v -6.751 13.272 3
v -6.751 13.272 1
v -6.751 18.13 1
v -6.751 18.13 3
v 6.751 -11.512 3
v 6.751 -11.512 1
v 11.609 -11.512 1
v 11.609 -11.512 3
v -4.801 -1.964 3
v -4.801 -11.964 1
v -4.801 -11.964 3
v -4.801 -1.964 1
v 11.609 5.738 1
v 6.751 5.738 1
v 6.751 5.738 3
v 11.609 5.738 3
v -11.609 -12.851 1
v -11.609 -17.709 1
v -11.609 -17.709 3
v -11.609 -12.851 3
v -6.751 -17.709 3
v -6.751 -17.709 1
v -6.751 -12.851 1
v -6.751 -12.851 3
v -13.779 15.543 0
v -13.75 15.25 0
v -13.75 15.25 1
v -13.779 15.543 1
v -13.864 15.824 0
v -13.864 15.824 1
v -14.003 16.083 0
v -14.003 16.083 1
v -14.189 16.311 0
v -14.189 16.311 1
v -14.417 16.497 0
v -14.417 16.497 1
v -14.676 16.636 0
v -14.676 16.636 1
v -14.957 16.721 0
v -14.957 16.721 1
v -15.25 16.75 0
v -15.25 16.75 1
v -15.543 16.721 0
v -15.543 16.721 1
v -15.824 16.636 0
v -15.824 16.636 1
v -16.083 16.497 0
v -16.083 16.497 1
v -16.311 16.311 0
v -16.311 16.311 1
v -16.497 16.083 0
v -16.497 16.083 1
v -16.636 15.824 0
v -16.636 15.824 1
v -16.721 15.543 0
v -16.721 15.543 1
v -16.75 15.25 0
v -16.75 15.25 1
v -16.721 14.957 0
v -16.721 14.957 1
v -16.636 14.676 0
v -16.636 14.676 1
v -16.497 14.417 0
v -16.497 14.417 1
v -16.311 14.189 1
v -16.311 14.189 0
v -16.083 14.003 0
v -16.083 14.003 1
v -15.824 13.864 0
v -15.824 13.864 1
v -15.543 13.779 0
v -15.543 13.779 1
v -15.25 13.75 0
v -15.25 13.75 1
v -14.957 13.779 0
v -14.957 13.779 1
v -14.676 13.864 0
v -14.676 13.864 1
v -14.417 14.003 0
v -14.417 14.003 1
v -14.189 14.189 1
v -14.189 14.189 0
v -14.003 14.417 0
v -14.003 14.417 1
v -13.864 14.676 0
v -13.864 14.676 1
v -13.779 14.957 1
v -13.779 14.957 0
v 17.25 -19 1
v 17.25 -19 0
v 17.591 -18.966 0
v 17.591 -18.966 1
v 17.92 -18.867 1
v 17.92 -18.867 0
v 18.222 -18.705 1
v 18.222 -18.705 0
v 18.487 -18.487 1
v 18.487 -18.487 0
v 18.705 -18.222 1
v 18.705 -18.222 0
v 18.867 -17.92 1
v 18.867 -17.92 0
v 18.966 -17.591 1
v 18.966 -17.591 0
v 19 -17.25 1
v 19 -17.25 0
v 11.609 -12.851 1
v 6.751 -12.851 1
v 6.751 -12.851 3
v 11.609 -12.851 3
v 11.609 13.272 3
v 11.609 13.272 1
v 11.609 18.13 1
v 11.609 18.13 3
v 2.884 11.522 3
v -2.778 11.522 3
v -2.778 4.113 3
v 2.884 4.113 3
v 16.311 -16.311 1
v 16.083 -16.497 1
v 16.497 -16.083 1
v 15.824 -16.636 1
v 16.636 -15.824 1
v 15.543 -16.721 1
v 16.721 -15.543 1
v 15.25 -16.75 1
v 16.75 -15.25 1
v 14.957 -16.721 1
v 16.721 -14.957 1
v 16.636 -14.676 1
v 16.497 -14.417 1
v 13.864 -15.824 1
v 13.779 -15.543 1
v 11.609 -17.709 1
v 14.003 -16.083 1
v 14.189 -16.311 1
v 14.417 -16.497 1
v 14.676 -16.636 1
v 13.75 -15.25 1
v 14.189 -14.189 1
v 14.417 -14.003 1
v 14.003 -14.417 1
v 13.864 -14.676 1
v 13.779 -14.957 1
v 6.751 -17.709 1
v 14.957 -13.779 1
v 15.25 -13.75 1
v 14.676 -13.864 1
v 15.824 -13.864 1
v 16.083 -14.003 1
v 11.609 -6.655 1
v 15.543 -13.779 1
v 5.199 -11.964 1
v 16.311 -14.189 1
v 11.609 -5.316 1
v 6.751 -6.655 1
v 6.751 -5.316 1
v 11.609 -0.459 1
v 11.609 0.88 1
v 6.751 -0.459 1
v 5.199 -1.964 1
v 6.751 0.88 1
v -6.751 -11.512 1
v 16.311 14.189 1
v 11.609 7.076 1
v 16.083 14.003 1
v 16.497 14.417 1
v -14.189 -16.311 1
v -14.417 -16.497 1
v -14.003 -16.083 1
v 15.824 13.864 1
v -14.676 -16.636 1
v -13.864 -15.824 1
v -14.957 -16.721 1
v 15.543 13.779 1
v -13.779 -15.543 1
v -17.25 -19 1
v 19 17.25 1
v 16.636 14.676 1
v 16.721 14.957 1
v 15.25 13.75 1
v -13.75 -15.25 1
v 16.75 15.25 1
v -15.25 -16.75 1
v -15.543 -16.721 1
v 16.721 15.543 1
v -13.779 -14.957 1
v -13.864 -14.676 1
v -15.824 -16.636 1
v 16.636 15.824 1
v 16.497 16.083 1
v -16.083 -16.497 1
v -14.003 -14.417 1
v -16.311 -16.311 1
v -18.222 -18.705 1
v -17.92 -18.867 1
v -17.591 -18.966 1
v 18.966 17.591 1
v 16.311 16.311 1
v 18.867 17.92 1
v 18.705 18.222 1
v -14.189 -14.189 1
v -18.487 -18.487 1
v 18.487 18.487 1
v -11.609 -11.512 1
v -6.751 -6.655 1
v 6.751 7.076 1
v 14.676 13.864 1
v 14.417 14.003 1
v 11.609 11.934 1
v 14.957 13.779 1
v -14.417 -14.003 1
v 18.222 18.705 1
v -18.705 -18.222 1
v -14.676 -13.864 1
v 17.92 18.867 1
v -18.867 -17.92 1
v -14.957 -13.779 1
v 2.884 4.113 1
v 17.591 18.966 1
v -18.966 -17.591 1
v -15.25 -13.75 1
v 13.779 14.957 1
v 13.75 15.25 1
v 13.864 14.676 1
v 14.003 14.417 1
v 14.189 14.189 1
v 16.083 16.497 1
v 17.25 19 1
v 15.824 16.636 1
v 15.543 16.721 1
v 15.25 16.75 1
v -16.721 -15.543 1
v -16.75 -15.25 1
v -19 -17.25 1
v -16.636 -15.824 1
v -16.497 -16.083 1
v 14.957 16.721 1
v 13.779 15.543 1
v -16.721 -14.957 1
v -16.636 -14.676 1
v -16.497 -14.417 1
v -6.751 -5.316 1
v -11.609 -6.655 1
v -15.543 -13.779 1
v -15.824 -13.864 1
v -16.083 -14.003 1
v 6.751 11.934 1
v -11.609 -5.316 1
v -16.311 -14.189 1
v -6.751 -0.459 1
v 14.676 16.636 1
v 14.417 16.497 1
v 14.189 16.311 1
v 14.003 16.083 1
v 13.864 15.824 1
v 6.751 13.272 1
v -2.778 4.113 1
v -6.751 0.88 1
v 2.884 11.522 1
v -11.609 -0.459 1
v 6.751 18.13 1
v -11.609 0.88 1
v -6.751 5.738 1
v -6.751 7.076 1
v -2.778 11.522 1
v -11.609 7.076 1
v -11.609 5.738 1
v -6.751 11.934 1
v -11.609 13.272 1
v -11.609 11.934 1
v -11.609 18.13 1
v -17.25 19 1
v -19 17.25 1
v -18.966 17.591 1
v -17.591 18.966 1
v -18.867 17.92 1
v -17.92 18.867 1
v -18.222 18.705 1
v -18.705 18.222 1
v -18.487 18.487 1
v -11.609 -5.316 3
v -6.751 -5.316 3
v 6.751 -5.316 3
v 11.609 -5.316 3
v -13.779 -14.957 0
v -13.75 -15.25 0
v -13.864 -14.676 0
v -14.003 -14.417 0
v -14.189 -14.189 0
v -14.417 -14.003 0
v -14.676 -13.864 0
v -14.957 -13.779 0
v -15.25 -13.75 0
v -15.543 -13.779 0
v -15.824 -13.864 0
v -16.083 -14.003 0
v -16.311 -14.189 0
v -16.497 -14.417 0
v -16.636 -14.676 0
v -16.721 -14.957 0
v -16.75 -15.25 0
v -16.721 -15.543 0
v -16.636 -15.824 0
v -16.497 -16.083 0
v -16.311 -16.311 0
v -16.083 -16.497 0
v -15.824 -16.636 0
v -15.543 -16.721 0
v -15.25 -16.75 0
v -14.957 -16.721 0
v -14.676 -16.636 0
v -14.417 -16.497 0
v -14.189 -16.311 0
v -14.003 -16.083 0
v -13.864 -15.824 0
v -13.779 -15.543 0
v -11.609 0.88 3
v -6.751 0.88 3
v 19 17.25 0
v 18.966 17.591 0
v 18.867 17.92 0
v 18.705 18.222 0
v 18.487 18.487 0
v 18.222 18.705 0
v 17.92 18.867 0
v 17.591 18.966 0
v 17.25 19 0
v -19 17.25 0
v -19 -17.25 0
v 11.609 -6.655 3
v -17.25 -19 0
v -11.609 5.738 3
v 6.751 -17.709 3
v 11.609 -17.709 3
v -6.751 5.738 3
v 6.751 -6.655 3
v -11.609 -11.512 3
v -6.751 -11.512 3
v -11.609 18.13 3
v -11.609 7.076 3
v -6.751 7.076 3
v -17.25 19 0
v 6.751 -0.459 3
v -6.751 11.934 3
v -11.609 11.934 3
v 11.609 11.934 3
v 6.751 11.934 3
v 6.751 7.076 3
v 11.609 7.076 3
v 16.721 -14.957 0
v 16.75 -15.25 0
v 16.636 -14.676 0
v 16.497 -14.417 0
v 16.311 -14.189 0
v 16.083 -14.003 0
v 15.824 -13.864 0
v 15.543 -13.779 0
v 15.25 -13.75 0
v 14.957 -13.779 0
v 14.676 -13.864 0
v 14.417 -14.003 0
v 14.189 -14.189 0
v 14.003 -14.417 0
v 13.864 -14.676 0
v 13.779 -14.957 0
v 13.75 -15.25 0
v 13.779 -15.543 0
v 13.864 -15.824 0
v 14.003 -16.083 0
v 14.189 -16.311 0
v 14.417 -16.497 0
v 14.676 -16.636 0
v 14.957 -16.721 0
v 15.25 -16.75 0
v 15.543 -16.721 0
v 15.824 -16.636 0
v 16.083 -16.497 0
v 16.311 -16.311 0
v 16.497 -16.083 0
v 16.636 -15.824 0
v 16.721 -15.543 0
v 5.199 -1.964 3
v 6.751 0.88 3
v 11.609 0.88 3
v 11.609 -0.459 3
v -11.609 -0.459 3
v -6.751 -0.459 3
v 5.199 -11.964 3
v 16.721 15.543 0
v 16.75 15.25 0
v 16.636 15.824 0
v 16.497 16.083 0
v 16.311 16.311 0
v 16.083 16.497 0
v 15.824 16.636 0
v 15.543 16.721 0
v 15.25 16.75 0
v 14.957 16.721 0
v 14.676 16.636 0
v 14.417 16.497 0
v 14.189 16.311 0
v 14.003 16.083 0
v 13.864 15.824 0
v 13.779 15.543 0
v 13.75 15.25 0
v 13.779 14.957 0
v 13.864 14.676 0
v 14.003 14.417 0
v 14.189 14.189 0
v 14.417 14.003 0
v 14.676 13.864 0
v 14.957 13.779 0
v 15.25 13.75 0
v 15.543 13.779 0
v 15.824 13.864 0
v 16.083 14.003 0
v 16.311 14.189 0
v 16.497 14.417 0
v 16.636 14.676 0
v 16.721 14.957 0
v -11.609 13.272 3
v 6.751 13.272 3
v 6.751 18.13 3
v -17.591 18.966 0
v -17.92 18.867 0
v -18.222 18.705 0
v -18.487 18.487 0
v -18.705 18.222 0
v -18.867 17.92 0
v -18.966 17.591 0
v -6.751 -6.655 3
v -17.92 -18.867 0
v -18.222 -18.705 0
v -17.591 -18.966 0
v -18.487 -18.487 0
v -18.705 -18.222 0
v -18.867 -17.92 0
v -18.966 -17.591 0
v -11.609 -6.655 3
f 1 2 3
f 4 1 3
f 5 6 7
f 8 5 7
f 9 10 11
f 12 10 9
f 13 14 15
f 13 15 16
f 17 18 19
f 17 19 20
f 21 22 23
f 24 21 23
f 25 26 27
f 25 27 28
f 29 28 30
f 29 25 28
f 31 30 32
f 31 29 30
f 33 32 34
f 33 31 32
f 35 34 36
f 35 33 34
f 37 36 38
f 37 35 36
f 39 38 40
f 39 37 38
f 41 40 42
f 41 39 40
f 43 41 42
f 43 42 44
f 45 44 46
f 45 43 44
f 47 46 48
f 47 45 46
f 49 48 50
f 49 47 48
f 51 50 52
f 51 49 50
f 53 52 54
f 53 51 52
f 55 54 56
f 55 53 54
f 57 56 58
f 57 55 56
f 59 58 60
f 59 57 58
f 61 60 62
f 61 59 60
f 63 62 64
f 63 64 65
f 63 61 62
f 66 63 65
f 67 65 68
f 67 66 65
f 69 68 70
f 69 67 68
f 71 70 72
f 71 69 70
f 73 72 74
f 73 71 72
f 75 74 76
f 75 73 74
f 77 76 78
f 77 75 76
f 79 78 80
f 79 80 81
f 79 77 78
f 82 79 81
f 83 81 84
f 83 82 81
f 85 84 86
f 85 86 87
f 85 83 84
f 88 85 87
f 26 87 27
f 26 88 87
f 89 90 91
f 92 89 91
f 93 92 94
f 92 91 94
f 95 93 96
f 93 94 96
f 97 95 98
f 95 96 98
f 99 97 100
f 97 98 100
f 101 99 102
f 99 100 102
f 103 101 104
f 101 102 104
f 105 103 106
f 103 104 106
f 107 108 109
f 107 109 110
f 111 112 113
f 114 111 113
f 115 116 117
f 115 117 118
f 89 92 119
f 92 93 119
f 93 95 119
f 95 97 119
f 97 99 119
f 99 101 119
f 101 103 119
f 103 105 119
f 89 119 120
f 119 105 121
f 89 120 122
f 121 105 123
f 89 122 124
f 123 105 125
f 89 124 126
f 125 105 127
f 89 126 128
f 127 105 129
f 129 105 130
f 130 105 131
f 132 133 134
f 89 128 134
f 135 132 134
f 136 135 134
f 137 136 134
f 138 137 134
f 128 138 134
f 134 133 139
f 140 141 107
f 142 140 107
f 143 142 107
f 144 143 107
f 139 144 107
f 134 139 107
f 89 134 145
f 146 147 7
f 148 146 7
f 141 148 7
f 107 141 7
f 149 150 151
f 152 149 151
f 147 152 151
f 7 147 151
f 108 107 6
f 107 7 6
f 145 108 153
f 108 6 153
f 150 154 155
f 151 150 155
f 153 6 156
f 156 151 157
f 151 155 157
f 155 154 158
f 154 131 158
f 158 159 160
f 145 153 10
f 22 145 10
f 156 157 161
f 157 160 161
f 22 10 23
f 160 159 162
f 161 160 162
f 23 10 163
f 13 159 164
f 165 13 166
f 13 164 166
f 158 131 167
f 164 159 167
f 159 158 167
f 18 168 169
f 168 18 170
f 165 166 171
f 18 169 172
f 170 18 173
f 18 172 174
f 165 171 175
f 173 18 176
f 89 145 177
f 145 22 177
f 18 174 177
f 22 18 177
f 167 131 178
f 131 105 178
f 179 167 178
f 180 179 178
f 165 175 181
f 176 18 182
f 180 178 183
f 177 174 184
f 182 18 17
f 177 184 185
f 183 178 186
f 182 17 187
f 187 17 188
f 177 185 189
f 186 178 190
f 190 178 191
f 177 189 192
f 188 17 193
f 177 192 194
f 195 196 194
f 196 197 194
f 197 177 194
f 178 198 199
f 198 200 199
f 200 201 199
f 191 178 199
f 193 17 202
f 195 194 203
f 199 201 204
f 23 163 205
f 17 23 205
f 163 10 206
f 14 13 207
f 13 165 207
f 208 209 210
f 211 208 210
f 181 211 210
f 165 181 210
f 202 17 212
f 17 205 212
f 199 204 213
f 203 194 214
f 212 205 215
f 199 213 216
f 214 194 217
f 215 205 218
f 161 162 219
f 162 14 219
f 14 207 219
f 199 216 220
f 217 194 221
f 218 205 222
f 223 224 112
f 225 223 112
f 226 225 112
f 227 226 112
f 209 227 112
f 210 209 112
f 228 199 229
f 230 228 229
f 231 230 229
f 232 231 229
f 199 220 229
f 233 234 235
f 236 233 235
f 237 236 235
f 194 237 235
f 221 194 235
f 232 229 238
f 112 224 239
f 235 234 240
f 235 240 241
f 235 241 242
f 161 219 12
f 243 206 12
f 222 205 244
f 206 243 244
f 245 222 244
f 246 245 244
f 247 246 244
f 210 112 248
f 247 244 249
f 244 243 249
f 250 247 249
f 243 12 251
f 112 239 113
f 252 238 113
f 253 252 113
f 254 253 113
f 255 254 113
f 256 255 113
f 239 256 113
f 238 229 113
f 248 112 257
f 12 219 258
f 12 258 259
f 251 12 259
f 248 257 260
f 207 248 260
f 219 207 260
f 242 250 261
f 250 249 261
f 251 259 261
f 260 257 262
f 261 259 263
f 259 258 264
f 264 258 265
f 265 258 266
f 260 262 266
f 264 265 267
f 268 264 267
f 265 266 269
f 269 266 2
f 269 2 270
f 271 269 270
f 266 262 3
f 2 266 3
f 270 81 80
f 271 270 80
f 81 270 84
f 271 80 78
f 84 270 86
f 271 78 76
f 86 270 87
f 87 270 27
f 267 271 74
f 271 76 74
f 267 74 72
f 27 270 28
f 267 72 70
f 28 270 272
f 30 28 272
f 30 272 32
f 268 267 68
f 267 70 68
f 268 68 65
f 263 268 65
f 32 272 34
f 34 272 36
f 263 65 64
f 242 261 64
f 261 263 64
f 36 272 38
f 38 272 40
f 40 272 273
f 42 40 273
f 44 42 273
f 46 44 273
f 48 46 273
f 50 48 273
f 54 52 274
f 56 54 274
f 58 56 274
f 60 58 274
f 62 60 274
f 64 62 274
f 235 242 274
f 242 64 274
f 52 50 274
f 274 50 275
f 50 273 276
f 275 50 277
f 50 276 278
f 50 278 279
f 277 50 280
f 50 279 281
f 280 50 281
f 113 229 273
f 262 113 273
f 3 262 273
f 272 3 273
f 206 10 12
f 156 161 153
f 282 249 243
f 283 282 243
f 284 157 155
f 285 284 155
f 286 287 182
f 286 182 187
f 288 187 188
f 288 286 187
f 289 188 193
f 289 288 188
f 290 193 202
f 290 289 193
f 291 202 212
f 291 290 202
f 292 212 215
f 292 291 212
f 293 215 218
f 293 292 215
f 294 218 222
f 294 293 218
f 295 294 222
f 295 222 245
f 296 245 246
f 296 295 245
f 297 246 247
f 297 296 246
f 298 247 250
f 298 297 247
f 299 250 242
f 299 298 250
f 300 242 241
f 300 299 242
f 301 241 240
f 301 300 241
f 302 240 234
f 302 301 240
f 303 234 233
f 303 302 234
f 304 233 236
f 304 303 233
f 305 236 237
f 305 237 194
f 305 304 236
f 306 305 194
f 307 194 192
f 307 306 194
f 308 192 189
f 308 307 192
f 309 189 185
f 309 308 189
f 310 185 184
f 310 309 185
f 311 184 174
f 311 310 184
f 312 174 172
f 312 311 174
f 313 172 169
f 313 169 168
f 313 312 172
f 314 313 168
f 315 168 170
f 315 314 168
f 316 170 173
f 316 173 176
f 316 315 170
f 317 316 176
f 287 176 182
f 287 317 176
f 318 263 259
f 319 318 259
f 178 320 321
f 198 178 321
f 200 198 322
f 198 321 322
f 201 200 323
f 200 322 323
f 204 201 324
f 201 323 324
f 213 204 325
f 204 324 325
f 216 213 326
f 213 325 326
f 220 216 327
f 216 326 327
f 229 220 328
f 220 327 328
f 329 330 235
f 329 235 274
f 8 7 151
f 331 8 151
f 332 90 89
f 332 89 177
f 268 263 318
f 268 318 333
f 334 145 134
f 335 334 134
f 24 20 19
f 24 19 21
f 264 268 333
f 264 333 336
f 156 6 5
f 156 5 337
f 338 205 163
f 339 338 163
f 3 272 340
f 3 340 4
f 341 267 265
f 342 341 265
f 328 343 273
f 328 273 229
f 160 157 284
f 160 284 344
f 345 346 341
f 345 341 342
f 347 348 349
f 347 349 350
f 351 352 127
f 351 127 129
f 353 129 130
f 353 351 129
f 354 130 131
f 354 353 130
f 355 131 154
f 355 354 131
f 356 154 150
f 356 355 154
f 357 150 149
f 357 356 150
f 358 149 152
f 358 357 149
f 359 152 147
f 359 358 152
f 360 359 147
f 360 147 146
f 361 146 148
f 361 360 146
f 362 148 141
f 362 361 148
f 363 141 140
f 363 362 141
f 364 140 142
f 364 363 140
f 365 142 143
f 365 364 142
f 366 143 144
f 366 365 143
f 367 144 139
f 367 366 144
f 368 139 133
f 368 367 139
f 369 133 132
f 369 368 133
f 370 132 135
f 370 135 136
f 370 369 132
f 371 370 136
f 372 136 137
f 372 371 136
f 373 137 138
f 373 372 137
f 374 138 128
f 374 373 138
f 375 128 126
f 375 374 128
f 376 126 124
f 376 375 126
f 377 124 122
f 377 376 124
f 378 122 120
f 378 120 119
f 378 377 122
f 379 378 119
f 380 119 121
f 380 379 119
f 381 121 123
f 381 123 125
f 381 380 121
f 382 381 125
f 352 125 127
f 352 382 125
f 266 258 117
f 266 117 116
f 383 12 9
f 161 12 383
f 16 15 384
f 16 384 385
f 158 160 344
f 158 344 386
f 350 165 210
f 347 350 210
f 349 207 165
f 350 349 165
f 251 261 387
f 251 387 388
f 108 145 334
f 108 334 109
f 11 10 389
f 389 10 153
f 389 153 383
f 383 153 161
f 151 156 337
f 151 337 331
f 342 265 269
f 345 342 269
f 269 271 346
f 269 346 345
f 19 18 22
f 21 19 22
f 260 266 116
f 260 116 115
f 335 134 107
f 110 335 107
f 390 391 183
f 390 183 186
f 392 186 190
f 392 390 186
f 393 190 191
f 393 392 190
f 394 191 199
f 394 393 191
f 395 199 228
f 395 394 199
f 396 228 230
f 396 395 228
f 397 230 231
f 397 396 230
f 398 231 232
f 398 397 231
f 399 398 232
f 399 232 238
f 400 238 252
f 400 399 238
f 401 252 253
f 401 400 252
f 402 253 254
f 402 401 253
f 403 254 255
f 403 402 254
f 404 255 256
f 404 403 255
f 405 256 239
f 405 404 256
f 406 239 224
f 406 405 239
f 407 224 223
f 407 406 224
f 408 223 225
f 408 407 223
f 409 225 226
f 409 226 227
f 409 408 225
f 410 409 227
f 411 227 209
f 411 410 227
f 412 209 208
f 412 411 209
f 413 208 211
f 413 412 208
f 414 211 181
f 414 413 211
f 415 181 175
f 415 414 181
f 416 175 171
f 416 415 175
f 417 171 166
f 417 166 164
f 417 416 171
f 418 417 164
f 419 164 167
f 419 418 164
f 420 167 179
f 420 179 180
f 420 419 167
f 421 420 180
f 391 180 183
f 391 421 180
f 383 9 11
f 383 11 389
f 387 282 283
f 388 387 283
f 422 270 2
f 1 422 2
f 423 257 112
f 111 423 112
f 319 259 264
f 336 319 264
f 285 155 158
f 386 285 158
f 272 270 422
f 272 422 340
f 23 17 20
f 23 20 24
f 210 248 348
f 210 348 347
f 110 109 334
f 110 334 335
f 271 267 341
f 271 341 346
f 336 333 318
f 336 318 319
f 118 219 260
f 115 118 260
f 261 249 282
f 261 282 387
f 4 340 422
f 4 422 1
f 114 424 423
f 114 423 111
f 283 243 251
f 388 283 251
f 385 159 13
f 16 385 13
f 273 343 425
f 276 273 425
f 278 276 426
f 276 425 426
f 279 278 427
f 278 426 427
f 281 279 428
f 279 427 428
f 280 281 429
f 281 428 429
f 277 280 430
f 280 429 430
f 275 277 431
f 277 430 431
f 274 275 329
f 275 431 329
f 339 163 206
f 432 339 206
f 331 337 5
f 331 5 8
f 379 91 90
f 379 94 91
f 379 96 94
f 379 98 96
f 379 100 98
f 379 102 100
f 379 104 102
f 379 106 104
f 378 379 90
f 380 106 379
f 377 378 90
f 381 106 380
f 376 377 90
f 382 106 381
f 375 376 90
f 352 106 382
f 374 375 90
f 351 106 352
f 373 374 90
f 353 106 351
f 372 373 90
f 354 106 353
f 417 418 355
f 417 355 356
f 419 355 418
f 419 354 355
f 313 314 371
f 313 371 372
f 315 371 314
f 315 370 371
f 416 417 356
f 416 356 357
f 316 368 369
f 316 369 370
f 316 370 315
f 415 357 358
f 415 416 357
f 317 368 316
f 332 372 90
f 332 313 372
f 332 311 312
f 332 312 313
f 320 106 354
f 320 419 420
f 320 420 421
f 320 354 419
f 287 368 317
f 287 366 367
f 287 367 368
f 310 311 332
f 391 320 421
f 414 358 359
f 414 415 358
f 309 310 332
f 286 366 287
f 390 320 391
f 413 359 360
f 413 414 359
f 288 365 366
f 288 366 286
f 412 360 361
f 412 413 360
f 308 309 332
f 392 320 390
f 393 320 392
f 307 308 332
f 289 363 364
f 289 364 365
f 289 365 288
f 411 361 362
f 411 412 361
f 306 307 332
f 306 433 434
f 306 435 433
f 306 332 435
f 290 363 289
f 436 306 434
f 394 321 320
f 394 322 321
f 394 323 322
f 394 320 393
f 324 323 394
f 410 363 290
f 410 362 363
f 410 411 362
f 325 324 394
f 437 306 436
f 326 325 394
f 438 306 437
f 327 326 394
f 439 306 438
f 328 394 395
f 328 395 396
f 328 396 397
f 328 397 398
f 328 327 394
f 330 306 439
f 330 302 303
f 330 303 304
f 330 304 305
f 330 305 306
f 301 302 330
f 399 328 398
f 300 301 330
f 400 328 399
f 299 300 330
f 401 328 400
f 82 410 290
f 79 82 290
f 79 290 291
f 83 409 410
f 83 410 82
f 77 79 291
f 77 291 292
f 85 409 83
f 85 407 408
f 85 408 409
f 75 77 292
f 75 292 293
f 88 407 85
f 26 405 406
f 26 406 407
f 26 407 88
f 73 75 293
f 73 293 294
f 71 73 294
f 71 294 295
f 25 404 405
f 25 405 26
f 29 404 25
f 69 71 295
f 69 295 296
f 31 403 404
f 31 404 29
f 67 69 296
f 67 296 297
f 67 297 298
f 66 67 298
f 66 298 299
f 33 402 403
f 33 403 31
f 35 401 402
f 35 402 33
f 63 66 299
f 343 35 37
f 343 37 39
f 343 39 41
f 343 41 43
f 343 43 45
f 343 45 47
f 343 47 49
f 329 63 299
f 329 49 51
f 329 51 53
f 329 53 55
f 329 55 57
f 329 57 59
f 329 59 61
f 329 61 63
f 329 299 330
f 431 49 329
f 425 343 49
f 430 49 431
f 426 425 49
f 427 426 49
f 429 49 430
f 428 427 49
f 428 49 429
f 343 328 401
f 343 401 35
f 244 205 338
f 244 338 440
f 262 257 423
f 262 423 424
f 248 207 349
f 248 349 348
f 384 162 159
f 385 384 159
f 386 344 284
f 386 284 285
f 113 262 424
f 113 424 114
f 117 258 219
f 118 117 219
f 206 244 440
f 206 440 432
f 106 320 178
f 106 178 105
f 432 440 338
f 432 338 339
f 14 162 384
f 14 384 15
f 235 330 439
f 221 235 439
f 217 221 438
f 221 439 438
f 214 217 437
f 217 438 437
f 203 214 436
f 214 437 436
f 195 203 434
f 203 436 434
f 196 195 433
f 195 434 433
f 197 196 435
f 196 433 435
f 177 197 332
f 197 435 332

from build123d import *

# Parameters (mm, degrees)
SKETCH_R      = 1.5
PAD_DEPTH     = 1
SKETCH001_W   = 10
SKETCH001_H   = 10
SKETCH001_W_2 = 4.857736
SKETCH001_H_2 = 4.857736
SKETCH001_W_3 = 5.662197
SKETCH001_H_3 = 7.409003
SKETCH001_H_4 = 4.857737
PAD001_DEPTH  = 2


with BuildPart() as part:
    # Sketch → Pad (new body)
    with BuildSketch(Plane.XY):
        with BuildLine():
            Line((-17.25, 19), (17.25, 19))
            ThreePointArc((19, 17.25), (18.487437, 18.487437), (17.25, 19))
            Line((19, 17.25), (19, -17.25))
            ThreePointArc((17.25, -19), (18.487437, -18.487437), (19, -17.25))
            Line((17.25, -19), (-17.25, -19))
            ThreePointArc((-19, -17.25), (-18.487437, -18.487437), (-17.25, -19))
            Line((-19, -17.25), (-19, 17.25))
            ThreePointArc((-17.25, 19), (-18.487437, 18.487437), (-19, 17.25))
        make_face()
        with Locations((15.25, 15.25)):
            Circle(SKETCH_R, mode=Mode.SUBTRACT)
        with Locations((-15.25, -15.25)):
            Circle(SKETCH_R, mode=Mode.SUBTRACT)
        with Locations((-15.25, 15.25)):
            Circle(SKETCH_R, mode=Mode.SUBTRACT)
        with Locations((15.25, -15.25)):
            Circle(SKETCH_R, mode=Mode.SUBTRACT)
    extrude(amount=PAD_DEPTH)

    # Sketch001 (on Face14 of Pad) → Pad001 (join)
    with BuildSketch(Plane.XY.offset(1)):
        with Locations((0.198833, -6.963992)):
            Rectangle(SKETCH001_W, SKETCH001_H)
        with Locations((-9.179753, 15.701071)):
            Rectangle(SKETCH001_W_2, SKETCH001_H_2)
        with Locations((0.053276, 7.817709)):
            Rectangle(SKETCH001_W_3, SKETCH001_H_3)
        with Locations((-9.179753, 9.504914)):
            Rectangle(SKETCH001_W_2, SKETCH001_H_4)
        with Locations((-9.179753, 3.308758)):
            Rectangle(SKETCH001_W_2, SKETCH001_H_4)
        with Locations((-9.179753, -2.887397)):
            Rectangle(SKETCH001_W_2, SKETCH001_H_4)
        with Locations((-9.179753, -9.083554)):
            Rectangle(SKETCH001_W_2, SKETCH001_H_2)
        with Locations((-9.179753, -15.27971)):
            Rectangle(SKETCH001_W_2, SKETCH001_H_2)
        with Locations((9.179753, 15.701071)):
            Rectangle(SKETCH001_W_2, SKETCH001_H_2)
        with Locations((9.179753, 9.504914)):
            Rectangle(SKETCH001_W_2, SKETCH001_H_4)
        with Locations((9.179753, 3.308758)):
            Rectangle(SKETCH001_W_2, SKETCH001_H_4)
        with Locations((9.179753, -2.887397)):
            Rectangle(SKETCH001_W_2, SKETCH001_H_4)
        with Locations((9.179753, -9.083554)):
            Rectangle(SKETCH001_W_2, SKETCH001_H_2)
        with Locations((9.179753, -15.27971)):
            Rectangle(SKETCH001_W_2, SKETCH001_H_2)
    extrude(amount=PAD001_DEPTH)


solid = part.part
